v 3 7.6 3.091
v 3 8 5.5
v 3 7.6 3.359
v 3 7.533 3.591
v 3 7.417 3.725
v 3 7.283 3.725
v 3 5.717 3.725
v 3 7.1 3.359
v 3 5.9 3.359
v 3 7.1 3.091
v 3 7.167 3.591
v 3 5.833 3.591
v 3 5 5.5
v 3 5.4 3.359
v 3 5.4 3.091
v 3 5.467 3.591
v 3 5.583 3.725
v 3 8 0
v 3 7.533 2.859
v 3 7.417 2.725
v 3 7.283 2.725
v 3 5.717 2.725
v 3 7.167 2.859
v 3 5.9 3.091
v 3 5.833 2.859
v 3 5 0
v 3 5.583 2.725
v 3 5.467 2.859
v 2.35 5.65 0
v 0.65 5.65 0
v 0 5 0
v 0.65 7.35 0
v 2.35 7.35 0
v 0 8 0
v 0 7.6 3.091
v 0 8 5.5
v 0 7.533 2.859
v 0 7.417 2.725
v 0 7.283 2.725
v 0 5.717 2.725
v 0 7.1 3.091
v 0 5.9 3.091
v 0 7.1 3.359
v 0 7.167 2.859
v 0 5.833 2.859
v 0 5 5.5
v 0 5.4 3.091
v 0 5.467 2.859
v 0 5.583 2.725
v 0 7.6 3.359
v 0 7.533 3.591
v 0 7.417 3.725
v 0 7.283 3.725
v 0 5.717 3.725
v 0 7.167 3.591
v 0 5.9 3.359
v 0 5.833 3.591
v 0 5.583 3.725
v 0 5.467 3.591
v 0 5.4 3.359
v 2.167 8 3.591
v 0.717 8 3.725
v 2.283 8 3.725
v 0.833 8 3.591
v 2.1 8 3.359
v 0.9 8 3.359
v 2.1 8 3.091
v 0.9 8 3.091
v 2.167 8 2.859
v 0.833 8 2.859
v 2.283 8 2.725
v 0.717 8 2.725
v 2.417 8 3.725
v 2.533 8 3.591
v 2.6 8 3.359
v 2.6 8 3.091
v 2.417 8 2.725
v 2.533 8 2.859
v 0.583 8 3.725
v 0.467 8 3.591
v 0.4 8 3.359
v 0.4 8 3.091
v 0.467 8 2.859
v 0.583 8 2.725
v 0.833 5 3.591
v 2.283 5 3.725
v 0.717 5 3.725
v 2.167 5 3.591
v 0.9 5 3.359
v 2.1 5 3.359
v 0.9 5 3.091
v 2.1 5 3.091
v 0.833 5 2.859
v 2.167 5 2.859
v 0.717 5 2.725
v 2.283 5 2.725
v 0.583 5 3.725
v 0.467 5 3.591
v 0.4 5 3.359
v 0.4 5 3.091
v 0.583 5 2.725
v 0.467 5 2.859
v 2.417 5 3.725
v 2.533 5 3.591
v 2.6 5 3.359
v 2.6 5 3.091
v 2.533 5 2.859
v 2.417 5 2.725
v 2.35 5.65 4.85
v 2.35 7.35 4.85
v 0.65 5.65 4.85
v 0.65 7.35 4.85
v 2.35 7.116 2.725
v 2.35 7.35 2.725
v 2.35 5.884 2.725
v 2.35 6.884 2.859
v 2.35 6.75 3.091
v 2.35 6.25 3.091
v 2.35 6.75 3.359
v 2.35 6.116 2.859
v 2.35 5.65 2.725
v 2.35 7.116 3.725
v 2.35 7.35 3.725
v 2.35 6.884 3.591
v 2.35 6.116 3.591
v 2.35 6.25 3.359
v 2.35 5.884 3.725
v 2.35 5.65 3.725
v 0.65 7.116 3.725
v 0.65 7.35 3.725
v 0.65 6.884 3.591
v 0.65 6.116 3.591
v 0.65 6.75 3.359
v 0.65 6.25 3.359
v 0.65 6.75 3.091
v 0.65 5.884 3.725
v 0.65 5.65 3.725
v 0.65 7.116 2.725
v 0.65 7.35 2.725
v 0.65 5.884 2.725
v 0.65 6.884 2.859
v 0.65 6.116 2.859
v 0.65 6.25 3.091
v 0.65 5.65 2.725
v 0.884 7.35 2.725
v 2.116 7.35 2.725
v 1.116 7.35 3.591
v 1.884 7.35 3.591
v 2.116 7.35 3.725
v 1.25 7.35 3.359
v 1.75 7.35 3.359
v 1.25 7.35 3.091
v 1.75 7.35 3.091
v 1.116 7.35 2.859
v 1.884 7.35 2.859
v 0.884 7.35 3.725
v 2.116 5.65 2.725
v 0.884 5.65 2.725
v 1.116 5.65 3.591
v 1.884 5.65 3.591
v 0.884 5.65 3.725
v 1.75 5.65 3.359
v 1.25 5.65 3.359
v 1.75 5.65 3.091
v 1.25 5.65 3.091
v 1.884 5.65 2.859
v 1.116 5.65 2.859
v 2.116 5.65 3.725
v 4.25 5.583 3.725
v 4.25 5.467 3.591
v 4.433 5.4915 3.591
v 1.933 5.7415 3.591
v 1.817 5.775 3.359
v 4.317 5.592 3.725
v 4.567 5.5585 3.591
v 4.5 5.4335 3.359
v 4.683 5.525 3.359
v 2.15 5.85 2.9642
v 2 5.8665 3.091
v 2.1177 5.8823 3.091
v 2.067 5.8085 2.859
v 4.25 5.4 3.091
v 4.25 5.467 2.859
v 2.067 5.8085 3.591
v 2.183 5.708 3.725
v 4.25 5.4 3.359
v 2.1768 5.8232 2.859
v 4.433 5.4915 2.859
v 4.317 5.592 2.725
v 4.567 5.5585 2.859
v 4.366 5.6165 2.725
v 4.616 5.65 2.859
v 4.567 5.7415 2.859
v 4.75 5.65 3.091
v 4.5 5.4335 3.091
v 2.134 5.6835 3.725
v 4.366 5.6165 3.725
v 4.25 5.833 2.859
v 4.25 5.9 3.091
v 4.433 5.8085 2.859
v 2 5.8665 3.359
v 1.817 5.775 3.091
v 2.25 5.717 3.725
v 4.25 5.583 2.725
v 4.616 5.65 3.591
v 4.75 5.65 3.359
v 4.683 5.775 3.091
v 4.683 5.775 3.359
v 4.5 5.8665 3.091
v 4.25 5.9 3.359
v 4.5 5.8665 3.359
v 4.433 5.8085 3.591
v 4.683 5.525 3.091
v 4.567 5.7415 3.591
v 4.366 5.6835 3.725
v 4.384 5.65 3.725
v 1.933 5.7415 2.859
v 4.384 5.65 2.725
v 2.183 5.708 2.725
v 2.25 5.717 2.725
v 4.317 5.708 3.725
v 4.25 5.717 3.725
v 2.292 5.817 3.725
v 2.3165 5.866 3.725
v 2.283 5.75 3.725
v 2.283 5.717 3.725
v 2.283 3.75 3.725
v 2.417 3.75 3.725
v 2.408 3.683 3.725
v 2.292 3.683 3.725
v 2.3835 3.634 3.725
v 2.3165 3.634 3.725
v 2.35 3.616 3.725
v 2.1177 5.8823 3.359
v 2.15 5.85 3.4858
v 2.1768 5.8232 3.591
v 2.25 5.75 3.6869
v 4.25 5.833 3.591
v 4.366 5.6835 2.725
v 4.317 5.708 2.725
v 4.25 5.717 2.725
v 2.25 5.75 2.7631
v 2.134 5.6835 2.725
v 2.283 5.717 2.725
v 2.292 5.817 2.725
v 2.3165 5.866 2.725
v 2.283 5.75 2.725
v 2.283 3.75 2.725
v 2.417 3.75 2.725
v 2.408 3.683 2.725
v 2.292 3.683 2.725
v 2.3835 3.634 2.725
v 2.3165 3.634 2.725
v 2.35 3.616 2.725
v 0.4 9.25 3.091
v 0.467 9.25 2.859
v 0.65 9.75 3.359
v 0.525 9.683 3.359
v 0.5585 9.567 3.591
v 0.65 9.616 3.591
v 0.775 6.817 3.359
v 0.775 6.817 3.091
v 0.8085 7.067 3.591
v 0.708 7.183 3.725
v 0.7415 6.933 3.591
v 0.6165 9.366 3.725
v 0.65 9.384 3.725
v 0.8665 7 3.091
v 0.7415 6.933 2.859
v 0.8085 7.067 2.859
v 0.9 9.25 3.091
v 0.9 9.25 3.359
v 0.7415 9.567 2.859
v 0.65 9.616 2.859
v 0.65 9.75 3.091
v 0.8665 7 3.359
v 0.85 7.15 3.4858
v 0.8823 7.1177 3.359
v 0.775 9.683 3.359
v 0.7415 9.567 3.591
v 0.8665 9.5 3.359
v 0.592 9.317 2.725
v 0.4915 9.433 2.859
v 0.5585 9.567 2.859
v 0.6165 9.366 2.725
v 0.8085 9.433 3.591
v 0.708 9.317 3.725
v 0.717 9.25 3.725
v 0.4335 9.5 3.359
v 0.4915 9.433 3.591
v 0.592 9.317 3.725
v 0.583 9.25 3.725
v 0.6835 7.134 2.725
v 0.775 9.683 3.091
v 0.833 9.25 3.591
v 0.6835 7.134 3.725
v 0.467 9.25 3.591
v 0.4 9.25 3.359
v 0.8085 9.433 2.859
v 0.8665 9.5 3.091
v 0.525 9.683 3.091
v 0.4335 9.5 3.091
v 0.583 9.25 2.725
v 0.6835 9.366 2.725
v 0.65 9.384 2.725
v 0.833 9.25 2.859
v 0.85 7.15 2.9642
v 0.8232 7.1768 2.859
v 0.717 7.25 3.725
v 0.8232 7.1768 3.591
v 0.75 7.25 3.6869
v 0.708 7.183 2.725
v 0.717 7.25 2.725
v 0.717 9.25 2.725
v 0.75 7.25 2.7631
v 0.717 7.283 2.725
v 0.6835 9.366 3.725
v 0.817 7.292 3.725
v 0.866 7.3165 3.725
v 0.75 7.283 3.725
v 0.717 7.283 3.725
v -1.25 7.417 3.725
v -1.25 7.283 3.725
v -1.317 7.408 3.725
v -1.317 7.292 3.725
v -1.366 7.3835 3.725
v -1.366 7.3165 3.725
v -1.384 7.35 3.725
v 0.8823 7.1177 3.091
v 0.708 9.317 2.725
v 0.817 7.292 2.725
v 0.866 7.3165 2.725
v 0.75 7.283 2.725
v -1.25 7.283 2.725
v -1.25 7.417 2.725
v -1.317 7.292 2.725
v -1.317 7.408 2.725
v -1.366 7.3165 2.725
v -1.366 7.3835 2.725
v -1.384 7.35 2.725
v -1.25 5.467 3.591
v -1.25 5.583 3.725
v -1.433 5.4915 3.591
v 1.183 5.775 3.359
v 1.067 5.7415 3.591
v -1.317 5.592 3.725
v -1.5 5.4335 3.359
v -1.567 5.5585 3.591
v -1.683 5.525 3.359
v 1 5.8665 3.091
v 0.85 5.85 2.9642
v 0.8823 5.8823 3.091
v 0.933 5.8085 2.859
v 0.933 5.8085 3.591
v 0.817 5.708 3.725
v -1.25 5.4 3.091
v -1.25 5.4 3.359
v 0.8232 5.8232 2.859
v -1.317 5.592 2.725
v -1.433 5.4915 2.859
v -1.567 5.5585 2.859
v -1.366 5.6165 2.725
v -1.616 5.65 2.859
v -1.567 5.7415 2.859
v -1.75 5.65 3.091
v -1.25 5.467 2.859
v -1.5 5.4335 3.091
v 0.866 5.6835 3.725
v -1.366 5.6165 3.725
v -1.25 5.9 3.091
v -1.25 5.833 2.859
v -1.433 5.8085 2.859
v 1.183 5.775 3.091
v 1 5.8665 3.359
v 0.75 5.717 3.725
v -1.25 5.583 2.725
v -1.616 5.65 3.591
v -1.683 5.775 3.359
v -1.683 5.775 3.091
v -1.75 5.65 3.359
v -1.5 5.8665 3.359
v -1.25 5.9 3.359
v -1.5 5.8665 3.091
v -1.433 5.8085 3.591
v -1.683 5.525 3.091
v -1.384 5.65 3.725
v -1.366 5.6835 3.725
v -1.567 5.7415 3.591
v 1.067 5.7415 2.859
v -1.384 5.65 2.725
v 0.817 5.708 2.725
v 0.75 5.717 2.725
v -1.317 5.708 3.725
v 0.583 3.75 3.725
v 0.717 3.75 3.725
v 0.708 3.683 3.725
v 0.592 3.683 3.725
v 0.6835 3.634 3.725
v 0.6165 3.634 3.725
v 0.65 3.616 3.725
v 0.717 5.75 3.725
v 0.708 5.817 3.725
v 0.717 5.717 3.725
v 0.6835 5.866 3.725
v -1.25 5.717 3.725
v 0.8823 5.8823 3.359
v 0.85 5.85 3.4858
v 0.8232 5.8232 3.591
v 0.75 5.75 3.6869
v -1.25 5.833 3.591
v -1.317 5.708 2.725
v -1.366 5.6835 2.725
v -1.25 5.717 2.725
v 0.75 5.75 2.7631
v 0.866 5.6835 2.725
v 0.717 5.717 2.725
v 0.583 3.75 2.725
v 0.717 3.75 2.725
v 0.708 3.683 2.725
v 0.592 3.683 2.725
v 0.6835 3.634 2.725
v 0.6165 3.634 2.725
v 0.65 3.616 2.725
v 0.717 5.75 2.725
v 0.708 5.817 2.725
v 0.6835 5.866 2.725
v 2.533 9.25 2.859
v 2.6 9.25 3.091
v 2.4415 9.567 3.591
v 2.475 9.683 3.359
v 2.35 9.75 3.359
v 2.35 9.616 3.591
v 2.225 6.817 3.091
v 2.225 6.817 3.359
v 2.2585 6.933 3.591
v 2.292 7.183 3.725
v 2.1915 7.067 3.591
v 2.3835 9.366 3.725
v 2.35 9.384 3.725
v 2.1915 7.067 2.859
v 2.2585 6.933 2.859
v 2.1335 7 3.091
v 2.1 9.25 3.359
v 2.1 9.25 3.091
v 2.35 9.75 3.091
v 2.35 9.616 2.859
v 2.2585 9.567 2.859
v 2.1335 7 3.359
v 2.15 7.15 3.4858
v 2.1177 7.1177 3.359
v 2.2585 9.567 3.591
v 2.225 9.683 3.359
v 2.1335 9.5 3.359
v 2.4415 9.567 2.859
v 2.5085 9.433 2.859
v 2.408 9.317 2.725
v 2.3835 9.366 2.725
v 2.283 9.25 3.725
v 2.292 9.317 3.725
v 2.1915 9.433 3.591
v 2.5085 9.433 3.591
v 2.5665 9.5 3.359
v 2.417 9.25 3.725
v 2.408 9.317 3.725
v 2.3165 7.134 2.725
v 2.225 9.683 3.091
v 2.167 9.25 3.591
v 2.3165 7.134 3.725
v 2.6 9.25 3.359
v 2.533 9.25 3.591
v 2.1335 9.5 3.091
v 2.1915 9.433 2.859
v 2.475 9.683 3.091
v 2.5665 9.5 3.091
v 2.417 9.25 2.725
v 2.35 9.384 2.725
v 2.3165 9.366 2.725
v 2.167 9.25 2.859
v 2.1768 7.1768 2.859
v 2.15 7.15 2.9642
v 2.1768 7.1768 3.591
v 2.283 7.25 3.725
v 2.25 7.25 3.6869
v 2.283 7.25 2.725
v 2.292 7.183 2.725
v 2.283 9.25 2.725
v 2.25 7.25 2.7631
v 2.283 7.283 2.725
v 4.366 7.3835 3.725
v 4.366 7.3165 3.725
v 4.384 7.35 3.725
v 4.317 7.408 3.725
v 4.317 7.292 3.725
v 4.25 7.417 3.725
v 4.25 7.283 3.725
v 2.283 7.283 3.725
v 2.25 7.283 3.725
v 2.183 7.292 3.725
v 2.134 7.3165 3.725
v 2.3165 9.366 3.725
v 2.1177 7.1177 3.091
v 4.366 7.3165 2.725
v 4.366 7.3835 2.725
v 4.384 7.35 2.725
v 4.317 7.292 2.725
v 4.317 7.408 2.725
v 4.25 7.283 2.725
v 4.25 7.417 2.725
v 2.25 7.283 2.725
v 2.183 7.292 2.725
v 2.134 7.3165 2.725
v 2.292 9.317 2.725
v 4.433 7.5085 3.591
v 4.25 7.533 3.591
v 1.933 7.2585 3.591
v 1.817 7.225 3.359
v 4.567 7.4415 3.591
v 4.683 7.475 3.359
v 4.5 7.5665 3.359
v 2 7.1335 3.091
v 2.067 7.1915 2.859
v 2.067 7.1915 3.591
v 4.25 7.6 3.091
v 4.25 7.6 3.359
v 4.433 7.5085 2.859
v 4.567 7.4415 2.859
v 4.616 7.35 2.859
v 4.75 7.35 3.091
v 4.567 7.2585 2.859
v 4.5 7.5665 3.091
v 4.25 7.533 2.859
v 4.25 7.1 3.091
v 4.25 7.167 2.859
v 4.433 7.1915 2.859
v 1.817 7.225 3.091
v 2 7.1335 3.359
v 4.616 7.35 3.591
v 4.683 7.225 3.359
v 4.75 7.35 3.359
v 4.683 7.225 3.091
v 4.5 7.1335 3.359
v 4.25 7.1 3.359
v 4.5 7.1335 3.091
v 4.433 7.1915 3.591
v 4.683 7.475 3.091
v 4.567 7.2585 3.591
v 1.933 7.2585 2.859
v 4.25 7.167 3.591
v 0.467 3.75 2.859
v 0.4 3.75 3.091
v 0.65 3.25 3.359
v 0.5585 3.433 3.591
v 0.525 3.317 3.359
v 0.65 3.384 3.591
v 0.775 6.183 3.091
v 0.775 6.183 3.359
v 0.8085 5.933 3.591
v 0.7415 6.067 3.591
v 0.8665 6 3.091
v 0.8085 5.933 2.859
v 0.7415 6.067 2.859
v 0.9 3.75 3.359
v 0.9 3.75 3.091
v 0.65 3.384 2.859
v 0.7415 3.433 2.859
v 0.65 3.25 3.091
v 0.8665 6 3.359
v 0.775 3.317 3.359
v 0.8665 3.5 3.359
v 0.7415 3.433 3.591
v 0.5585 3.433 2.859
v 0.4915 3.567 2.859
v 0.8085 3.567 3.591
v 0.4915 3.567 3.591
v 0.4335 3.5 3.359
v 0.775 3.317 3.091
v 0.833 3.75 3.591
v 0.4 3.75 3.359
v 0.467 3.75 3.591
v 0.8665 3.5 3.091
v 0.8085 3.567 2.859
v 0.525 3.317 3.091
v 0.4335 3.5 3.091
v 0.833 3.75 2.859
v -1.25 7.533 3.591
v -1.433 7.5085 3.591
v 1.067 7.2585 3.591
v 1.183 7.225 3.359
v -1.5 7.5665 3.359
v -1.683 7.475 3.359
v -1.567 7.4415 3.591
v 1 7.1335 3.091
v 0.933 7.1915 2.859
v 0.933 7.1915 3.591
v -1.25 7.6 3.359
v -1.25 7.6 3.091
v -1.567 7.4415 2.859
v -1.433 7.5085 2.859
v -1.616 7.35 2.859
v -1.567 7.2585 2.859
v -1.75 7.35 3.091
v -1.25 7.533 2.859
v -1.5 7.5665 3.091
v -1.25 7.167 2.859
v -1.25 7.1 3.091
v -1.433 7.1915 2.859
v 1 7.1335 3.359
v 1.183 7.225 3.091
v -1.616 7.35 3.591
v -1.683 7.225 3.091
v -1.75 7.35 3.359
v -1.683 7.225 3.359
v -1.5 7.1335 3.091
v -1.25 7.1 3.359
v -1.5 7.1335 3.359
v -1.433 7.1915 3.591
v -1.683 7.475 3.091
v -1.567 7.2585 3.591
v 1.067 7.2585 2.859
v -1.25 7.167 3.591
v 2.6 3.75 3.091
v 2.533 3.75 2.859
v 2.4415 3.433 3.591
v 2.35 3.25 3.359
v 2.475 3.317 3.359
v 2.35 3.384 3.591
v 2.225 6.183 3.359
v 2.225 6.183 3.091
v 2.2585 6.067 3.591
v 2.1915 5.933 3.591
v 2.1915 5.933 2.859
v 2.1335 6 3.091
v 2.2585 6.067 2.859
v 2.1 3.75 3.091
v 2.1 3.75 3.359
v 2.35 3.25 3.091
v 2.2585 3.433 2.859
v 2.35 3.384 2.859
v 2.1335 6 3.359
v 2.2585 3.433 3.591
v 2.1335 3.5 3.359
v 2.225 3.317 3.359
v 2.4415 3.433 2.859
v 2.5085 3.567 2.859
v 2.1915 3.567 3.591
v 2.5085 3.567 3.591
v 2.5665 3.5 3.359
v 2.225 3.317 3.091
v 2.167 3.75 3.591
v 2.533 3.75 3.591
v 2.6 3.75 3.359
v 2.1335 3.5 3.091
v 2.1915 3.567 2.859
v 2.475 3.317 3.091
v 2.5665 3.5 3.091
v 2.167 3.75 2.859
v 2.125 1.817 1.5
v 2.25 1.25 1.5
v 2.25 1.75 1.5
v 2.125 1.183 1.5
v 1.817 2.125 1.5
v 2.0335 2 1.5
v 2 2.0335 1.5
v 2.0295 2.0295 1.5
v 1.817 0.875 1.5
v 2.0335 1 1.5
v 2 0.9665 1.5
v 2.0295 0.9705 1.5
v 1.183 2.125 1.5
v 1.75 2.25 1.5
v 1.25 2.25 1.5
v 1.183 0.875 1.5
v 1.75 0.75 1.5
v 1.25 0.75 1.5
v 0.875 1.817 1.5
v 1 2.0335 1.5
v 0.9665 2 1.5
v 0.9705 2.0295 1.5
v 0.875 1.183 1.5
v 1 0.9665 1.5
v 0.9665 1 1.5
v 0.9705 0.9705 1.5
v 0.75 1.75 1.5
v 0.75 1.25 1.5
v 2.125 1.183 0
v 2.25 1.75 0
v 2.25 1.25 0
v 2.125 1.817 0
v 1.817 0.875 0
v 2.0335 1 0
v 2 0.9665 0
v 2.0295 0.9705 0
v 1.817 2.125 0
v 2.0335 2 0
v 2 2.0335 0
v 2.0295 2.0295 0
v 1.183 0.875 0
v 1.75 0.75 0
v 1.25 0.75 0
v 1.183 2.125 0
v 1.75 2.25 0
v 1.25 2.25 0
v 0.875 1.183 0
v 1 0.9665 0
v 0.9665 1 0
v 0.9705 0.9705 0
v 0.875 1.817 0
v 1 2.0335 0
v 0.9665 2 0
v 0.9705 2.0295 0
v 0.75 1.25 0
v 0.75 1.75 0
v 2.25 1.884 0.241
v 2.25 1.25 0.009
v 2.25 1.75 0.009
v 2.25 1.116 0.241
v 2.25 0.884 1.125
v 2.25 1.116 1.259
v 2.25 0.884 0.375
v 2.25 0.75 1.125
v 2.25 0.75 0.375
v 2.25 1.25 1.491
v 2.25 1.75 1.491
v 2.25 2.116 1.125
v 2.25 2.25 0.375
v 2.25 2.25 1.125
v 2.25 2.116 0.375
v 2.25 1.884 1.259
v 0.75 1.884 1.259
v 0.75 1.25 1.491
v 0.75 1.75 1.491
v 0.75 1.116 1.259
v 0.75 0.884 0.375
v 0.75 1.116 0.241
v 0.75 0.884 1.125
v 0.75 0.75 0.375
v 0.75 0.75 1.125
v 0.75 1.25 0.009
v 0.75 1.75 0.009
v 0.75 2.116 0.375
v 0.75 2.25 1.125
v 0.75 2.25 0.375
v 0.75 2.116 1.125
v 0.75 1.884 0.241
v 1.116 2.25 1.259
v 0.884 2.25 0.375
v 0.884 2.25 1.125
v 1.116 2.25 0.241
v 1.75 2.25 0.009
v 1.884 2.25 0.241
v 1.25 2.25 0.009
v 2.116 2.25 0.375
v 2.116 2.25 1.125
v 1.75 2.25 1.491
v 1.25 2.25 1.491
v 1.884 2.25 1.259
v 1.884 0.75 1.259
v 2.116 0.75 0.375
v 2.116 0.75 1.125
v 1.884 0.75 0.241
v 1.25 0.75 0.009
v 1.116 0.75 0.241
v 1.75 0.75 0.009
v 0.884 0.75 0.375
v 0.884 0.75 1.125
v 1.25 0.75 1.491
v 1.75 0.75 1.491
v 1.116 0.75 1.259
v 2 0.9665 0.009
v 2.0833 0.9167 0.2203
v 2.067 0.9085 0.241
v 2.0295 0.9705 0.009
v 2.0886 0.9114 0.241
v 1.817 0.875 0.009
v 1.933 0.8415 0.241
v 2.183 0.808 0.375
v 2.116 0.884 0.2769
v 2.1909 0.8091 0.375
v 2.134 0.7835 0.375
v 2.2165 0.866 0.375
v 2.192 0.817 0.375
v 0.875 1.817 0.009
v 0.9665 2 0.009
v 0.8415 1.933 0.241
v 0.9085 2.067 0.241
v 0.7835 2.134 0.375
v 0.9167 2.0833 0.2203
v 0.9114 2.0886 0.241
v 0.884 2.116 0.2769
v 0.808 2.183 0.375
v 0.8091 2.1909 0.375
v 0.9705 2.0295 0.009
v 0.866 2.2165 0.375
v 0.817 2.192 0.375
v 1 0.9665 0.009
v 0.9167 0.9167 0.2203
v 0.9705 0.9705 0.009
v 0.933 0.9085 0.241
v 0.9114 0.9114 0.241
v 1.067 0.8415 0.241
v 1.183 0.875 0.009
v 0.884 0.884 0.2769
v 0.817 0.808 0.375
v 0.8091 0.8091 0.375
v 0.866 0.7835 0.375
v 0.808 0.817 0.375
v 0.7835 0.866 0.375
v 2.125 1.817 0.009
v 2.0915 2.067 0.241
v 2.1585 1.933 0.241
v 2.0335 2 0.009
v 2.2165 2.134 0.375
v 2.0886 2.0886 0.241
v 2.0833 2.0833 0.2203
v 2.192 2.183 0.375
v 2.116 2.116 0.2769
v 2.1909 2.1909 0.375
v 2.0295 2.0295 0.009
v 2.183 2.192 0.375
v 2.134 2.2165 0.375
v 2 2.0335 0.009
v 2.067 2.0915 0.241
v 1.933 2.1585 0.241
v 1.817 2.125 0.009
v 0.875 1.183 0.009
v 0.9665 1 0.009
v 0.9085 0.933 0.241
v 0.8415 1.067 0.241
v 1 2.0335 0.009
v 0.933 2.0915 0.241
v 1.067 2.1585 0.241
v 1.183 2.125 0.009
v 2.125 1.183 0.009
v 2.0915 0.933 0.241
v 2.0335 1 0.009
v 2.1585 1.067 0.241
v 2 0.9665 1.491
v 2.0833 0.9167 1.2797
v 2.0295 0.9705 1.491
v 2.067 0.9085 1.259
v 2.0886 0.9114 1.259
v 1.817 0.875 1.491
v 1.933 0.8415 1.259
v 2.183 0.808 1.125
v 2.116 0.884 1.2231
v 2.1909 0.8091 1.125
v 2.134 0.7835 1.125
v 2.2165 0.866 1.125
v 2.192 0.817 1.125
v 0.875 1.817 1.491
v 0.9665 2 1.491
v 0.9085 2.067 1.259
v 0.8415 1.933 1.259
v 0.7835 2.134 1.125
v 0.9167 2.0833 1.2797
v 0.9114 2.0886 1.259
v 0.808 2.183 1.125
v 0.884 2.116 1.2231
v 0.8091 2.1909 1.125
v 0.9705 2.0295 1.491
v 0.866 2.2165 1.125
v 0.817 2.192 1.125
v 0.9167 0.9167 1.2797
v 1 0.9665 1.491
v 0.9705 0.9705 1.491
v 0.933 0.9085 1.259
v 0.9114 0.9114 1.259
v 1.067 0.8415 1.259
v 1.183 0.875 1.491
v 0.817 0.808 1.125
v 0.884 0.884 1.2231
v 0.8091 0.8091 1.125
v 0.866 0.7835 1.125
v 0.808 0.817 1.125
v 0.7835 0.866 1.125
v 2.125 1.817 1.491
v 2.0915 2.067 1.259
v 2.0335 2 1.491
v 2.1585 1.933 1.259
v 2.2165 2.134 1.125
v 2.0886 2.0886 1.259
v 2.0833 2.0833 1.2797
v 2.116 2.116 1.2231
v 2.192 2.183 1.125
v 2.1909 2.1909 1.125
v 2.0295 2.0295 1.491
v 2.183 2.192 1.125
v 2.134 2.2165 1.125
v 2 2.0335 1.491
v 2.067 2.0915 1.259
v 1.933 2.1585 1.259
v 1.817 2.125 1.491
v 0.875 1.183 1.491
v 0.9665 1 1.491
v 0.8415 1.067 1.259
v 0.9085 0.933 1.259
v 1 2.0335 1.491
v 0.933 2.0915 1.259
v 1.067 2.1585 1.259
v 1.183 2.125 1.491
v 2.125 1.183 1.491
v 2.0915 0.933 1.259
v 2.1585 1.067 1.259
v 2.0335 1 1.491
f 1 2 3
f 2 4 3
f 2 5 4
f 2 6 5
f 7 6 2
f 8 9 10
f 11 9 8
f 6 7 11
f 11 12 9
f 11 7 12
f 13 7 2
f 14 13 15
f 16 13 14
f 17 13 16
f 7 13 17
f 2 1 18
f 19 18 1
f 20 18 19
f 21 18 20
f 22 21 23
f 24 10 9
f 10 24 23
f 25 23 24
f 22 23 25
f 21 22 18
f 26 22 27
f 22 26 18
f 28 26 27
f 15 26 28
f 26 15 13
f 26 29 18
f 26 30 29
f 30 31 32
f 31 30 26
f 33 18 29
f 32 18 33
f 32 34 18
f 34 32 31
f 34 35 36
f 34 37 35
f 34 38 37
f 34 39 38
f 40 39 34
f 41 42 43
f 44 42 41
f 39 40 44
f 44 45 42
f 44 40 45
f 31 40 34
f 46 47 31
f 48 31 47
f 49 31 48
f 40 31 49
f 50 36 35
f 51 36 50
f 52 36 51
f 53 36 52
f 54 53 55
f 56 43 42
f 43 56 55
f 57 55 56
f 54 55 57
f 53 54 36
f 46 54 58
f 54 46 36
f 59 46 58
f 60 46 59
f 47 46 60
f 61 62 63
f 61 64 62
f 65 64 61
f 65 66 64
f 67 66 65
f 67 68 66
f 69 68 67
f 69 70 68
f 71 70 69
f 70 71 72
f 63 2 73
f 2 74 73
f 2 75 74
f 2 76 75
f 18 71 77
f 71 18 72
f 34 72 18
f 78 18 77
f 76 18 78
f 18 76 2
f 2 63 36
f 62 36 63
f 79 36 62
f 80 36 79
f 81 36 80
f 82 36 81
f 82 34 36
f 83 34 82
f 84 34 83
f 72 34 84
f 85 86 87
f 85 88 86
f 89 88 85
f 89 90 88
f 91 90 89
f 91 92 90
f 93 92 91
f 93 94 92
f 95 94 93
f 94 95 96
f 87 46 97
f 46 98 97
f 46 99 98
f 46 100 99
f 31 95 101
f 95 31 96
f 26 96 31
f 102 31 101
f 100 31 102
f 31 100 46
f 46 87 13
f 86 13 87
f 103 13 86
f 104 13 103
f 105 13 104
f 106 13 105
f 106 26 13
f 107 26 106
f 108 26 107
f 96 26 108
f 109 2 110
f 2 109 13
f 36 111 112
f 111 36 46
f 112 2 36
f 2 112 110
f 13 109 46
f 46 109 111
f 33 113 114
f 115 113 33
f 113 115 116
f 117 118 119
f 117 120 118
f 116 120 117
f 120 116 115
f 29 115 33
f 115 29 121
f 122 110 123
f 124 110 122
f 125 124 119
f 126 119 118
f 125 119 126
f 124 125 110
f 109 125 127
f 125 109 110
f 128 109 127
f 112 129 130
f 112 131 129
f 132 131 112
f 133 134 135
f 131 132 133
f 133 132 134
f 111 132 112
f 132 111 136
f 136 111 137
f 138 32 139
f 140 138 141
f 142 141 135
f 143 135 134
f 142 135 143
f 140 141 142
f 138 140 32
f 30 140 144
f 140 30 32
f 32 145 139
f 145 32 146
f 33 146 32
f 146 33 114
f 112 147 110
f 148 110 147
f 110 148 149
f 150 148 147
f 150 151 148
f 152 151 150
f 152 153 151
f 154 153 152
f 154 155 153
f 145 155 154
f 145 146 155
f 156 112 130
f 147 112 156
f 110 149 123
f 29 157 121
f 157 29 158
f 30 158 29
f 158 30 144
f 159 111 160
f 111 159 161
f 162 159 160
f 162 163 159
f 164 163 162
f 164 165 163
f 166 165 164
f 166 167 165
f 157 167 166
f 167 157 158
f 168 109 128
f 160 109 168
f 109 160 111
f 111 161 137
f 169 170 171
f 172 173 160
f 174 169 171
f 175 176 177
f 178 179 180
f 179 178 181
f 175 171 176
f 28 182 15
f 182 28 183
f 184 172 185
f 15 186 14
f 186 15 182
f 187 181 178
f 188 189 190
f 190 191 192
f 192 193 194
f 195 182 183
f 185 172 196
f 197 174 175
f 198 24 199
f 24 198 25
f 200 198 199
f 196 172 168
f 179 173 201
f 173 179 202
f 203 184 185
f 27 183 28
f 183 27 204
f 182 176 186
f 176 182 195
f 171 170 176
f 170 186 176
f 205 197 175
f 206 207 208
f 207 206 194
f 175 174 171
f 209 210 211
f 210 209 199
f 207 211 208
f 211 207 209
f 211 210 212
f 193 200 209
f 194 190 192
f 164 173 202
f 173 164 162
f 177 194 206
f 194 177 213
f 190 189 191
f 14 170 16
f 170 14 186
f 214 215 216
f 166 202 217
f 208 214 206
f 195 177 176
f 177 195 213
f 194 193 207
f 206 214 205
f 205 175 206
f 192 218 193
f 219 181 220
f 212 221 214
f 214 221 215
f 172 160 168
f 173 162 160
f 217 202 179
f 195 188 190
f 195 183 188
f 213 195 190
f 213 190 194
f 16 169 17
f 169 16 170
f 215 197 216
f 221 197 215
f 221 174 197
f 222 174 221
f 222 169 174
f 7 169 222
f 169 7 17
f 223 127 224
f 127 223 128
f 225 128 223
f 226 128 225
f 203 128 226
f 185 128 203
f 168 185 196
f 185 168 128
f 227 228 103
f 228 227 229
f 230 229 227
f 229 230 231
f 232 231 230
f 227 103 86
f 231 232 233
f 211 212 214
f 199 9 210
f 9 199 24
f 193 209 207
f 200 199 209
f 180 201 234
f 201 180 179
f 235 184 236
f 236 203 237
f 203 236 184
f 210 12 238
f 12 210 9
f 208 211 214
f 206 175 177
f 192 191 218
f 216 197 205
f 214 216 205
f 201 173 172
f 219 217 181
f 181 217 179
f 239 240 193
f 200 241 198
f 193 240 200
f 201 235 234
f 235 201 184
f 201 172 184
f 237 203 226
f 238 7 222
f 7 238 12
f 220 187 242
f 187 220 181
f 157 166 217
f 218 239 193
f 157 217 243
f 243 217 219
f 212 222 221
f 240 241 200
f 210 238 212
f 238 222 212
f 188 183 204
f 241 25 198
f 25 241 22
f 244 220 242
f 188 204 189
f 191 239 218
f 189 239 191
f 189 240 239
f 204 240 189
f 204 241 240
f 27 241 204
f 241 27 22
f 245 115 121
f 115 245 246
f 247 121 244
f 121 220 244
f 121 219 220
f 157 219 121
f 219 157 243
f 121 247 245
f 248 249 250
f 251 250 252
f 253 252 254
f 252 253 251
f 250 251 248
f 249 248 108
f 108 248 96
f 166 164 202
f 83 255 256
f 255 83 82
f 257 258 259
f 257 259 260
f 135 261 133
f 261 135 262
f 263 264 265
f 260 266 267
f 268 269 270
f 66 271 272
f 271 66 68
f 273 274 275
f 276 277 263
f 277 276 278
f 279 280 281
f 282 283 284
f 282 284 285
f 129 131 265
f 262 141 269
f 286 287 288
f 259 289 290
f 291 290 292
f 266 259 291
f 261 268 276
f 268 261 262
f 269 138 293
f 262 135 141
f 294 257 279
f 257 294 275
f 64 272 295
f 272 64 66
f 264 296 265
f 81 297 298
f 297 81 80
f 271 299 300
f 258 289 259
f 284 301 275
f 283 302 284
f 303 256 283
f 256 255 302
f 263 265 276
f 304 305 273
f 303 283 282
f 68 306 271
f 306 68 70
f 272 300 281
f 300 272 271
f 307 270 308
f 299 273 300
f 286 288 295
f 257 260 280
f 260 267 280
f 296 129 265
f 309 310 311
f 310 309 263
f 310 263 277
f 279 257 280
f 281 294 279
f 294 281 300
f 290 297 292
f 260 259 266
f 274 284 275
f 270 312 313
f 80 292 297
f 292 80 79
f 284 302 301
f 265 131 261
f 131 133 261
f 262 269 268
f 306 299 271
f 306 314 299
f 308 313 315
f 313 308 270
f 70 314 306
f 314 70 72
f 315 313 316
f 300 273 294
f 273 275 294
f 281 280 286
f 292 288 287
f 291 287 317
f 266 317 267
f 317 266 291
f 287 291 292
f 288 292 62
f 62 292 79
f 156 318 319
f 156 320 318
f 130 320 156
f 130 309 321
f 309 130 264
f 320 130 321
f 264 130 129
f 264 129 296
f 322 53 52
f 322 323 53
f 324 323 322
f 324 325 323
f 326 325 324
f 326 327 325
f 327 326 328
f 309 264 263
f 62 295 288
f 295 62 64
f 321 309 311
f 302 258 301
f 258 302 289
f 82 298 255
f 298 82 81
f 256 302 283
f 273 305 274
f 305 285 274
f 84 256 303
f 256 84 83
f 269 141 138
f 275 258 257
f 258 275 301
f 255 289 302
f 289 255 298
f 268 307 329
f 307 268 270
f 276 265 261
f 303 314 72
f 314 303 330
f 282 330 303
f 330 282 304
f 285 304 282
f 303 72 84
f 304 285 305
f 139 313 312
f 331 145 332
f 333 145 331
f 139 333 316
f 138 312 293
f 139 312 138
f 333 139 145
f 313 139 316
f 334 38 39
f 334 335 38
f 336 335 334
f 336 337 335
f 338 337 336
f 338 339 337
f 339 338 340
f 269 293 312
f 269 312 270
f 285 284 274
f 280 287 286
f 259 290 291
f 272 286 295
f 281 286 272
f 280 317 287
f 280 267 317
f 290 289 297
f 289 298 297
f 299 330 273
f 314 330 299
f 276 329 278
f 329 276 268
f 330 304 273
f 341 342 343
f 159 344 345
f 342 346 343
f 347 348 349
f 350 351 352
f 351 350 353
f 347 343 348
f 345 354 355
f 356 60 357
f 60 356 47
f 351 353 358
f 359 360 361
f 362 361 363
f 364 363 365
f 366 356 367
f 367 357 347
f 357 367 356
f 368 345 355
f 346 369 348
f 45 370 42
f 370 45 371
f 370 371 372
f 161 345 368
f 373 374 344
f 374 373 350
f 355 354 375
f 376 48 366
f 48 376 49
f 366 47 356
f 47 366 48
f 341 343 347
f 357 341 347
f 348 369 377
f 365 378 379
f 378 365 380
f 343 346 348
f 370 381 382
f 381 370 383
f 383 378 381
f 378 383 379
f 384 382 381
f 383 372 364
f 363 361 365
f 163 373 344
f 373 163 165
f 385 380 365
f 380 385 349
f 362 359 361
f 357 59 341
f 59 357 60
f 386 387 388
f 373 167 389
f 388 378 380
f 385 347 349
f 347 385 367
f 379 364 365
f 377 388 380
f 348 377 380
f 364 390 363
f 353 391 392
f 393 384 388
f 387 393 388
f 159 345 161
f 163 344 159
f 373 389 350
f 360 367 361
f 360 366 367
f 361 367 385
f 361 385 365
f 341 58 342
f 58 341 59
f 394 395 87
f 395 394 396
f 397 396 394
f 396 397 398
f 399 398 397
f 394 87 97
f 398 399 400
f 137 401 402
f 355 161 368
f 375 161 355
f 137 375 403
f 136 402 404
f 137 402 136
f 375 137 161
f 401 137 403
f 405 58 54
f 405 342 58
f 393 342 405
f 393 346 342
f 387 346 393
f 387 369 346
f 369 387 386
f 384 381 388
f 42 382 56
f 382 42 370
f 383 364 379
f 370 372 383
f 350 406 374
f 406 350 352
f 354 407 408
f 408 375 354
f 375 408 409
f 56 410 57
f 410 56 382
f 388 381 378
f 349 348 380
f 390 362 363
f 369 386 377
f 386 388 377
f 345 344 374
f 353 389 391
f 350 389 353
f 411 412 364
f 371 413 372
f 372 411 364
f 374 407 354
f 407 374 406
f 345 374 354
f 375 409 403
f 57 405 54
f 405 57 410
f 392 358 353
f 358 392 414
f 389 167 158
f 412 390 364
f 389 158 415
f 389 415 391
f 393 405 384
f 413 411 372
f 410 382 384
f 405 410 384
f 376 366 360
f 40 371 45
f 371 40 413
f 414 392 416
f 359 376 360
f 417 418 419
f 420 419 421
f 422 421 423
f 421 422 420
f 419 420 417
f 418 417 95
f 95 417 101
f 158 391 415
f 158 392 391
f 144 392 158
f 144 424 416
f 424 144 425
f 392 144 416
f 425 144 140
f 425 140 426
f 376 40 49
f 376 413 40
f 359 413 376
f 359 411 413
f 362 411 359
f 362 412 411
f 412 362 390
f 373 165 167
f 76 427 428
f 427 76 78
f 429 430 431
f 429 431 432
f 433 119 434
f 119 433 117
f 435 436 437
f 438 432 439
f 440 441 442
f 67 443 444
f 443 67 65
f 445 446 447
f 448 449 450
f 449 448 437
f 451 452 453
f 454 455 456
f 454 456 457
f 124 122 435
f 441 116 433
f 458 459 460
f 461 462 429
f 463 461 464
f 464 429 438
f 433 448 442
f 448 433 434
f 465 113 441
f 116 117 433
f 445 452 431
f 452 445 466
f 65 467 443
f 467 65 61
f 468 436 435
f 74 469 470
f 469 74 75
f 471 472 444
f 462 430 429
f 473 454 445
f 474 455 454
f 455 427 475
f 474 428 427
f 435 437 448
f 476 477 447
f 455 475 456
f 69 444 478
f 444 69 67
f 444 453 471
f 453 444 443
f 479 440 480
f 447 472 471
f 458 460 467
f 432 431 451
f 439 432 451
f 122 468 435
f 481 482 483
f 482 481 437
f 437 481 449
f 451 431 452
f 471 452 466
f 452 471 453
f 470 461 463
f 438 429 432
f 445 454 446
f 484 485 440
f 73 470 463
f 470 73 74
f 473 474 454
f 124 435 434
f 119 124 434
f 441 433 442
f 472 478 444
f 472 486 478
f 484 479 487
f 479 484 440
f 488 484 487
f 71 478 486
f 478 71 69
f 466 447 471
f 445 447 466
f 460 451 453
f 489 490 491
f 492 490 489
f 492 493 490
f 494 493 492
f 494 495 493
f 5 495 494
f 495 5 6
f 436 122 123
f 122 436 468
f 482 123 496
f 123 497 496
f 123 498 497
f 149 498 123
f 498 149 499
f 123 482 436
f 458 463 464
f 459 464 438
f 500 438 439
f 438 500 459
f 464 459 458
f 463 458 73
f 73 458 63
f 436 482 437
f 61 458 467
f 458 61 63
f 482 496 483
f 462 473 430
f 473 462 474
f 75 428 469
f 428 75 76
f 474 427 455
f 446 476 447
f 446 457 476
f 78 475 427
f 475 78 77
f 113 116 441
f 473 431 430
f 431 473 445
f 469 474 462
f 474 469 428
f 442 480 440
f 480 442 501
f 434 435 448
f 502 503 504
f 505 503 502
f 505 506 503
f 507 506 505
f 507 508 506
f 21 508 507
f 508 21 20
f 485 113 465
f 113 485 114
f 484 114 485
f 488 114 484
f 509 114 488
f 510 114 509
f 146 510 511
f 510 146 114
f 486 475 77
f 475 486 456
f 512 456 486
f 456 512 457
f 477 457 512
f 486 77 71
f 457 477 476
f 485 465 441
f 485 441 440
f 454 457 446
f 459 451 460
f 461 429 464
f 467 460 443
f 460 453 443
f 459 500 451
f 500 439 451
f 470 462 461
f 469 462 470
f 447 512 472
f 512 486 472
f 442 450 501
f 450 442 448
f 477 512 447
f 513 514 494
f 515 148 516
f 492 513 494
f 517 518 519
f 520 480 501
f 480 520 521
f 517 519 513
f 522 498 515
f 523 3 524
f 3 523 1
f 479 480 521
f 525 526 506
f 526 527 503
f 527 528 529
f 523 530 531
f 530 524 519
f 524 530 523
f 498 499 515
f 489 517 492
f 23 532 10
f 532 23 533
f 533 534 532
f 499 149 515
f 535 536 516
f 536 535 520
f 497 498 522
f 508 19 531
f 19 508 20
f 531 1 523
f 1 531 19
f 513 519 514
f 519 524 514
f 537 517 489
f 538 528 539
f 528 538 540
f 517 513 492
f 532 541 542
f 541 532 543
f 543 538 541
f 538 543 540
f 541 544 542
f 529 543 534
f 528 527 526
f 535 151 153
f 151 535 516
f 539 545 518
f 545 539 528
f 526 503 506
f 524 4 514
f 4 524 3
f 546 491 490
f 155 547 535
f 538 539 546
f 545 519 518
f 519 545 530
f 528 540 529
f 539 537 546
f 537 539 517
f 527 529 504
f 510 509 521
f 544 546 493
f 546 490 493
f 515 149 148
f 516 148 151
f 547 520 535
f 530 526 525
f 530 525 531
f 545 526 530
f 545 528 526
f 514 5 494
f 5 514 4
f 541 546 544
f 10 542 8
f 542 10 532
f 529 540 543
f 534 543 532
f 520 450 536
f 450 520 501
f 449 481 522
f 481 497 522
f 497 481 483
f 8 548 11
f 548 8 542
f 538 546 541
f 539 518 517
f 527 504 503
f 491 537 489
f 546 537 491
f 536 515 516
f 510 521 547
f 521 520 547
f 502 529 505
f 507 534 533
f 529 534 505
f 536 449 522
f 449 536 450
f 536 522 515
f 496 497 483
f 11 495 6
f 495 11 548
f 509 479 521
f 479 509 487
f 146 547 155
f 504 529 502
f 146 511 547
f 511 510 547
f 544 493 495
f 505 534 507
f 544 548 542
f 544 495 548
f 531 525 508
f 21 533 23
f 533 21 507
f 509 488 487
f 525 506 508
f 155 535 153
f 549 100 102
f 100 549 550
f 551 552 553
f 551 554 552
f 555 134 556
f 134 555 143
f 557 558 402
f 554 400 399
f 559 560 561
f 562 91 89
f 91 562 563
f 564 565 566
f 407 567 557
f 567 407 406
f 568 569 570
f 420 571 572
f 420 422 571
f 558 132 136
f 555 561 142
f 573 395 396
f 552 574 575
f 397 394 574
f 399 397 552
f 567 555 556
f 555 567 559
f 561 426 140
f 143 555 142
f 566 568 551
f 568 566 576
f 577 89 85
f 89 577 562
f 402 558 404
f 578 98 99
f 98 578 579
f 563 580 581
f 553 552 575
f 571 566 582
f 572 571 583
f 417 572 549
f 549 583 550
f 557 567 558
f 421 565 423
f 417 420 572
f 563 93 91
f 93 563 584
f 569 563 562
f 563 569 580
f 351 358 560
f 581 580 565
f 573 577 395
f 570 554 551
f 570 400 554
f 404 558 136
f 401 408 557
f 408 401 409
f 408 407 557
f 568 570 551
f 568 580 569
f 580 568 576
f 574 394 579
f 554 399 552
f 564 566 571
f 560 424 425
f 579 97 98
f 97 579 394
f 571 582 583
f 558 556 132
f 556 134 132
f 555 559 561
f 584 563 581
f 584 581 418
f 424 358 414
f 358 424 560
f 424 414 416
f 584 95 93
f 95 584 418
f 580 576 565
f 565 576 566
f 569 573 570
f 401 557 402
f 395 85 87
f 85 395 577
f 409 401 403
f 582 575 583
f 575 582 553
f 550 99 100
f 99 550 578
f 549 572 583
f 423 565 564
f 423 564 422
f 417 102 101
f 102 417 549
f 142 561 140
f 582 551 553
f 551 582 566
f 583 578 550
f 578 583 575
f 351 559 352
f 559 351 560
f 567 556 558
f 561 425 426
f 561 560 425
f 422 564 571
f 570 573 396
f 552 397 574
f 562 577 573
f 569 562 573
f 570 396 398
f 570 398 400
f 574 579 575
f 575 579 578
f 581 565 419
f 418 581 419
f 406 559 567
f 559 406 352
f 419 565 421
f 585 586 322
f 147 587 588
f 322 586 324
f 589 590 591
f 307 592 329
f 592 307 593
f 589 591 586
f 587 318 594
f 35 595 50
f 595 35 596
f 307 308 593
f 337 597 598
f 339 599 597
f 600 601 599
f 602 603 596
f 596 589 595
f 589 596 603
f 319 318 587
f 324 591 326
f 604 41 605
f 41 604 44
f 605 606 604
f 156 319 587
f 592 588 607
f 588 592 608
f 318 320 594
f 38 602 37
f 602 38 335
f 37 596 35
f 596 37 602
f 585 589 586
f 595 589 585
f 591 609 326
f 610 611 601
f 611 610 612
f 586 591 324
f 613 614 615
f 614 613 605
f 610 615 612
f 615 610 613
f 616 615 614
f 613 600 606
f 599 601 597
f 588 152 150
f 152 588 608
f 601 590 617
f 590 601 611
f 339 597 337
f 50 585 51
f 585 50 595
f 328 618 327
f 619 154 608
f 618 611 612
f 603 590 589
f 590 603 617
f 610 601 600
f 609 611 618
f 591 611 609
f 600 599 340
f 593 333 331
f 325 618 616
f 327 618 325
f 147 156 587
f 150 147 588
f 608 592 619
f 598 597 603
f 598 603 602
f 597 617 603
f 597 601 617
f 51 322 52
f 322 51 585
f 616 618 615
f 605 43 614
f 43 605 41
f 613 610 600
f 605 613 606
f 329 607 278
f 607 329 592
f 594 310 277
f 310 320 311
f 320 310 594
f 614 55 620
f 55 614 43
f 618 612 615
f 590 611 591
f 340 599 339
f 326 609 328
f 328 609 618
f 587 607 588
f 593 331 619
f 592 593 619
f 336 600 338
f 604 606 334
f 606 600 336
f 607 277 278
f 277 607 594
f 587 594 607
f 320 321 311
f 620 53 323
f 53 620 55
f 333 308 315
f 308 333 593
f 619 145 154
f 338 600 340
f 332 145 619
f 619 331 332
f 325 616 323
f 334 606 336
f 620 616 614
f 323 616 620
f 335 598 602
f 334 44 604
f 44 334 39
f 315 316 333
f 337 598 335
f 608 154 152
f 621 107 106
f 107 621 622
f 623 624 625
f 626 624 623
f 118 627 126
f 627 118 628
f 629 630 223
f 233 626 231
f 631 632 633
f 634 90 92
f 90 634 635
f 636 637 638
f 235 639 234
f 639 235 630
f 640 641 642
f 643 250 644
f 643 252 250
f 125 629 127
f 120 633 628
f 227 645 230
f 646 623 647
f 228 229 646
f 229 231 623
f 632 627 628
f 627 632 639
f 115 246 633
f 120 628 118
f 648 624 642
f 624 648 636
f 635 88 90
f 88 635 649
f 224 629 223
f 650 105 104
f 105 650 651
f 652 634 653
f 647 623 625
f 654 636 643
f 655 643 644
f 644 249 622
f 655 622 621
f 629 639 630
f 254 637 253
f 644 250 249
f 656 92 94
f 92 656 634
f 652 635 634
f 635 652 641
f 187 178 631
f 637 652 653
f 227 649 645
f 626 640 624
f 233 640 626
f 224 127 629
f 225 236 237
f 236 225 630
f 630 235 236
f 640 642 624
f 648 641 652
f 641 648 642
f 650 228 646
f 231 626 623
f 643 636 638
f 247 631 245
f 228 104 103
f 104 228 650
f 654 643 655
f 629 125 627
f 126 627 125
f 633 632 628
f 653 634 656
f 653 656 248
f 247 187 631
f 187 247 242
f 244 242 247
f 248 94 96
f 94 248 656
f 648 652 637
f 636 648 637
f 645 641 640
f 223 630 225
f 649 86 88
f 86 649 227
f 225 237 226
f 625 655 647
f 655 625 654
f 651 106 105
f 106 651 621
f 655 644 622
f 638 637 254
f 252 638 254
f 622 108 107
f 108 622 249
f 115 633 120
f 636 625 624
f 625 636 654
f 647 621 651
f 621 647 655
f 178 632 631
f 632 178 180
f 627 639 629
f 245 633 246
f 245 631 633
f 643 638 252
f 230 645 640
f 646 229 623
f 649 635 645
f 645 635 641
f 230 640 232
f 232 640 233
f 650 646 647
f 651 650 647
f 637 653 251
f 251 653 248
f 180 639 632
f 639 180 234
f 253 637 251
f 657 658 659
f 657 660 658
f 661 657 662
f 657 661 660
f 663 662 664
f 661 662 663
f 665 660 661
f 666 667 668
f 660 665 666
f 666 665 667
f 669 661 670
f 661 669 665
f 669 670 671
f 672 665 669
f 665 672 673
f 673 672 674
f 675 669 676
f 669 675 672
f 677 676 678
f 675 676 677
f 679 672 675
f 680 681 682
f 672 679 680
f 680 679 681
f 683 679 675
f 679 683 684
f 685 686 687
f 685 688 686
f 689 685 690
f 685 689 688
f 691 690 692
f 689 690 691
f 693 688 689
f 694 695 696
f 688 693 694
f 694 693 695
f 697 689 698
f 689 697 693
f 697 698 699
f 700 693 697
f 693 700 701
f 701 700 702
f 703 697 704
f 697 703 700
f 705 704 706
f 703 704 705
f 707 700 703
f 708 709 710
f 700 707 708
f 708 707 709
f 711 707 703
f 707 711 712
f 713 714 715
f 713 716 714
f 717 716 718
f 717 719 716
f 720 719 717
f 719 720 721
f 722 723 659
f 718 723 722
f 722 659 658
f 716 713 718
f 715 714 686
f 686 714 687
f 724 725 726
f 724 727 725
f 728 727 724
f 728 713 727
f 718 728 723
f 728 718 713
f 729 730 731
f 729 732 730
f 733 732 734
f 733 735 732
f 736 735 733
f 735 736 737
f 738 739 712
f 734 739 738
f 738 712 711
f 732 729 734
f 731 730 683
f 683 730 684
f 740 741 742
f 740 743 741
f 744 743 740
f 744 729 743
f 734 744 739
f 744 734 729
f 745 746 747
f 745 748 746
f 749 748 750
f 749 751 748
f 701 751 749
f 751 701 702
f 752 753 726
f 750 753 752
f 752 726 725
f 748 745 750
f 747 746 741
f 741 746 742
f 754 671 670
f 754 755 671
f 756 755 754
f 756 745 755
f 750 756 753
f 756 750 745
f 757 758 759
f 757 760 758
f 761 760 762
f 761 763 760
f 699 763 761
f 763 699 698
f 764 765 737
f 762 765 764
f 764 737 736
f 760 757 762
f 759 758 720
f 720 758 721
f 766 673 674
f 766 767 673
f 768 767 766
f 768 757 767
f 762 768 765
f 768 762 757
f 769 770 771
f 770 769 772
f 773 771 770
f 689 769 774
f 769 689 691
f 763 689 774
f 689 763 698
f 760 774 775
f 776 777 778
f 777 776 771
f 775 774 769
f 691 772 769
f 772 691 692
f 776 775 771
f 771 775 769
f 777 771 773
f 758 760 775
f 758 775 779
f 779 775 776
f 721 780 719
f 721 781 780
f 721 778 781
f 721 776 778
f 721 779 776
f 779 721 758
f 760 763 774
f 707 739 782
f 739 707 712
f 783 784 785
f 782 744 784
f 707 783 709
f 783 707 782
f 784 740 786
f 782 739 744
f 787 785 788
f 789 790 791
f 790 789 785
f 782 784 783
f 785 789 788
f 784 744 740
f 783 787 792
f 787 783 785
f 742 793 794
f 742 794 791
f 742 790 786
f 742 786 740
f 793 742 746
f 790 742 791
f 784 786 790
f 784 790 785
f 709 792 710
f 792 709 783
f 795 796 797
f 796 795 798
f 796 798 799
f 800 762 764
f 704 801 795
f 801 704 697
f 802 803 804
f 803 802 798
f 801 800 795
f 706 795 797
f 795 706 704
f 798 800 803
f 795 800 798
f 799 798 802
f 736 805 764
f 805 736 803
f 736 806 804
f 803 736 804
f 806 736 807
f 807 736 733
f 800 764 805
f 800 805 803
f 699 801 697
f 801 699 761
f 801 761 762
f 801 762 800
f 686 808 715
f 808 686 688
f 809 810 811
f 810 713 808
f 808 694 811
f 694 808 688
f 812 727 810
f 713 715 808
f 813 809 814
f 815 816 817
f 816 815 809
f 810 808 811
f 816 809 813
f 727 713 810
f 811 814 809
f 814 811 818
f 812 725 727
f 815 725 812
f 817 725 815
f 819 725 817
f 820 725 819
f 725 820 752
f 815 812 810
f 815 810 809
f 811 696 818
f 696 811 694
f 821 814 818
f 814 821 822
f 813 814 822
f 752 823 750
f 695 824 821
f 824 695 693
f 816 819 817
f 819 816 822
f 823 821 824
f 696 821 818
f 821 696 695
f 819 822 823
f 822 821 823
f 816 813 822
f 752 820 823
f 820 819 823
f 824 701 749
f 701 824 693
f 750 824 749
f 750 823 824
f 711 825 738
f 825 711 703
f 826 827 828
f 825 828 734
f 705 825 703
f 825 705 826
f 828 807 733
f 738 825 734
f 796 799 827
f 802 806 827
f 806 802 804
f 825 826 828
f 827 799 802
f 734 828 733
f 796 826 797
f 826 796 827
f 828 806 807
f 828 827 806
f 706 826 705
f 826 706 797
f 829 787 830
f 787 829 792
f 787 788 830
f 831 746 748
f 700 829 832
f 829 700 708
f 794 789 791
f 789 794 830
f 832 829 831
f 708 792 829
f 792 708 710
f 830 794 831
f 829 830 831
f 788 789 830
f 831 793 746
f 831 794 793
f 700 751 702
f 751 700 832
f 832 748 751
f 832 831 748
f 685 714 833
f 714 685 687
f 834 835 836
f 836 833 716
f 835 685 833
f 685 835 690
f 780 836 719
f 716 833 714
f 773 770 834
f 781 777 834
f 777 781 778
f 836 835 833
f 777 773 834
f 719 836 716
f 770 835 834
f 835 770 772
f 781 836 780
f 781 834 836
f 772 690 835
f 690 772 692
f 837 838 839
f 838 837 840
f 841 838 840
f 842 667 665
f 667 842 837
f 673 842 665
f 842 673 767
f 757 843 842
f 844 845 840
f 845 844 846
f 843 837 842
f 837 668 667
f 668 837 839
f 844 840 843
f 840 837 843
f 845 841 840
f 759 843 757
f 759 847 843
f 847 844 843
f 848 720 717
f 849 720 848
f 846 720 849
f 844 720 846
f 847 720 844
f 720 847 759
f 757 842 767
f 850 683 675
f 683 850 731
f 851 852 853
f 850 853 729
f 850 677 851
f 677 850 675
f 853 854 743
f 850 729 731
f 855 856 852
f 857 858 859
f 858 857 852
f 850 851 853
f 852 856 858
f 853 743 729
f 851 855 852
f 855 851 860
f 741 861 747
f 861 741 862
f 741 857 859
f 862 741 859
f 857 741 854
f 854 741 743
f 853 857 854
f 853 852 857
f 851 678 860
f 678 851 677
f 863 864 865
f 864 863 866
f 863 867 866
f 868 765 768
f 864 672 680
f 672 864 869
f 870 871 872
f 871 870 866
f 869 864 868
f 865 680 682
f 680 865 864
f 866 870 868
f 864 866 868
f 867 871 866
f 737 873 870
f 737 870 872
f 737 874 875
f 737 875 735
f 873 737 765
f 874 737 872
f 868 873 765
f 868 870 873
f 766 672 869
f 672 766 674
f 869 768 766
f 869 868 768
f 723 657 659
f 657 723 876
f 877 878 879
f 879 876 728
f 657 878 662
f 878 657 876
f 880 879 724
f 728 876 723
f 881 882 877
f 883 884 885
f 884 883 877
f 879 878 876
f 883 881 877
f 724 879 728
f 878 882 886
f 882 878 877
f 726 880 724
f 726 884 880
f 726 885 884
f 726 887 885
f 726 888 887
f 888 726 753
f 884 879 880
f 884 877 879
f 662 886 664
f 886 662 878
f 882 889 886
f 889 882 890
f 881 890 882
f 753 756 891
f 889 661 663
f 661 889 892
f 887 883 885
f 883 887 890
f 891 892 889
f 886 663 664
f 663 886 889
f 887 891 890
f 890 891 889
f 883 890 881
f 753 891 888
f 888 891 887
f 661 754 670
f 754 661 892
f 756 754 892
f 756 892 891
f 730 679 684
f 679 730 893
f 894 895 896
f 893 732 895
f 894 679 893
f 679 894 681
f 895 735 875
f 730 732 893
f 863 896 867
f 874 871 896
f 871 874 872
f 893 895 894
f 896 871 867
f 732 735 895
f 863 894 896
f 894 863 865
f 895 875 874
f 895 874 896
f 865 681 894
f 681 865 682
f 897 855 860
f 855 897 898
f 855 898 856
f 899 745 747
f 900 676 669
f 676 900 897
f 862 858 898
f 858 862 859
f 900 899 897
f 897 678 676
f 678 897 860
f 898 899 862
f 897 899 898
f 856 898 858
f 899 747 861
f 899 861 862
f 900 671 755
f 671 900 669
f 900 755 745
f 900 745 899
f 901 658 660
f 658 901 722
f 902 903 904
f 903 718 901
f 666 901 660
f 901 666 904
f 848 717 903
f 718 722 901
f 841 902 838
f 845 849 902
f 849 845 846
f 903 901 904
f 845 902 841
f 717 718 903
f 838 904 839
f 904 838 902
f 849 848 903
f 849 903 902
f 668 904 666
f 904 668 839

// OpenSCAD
// BGSD
include <../lib/boardgame_insert_toolkit_lib.4.scad>;
data = [
    // Source STL: Tokens B.stl
    // STL bbox min [-66, -36, 0] max [-14, 119, 28] size [52, 155, 28]
    // Detected compartments: 3; wall thickness: 1.5mm
    // Estimated bottom thickness: 0.8mm
    // Inferred side cutouts: left (medium)
    // Inferred external profile cuts: back-right [19, 11]
    // Tokens B cavity 1: SQUARE shape (high, curved ratio 0)
    // Tokens B cavity 2: SQUARE shape (high, curved ratio 0)
    // Tokens B cavity 3: SQUARE shape (high, curved ratio 0)
    // Tokens B profile extension: SQUARE shape (high, curved ratio 0)
    [ OBJECT_BOX,
        [ NAME, "Tokens B" ],
        [ BOX_SIZE_XYZ, [52, 155, 28] ],
        [ BOX_WALL_THICKNESS, 1.5 ],
        [ BOX_NO_LID_B, true ],
        [ BOX_FEATURE,
            [ NAME, "Tokens B cavity 1" ],
            [ FTR_COMPARTMENT_SIZE_XYZ, [49, 48, 26.5] ],
            [ FTR_NUM_COMPARTMENTS_XY, [1, 1] ],
            [ FTR_SHAPE, SQUARE ],
            [ POSITION_XY, [0, 0] ],
            [ FTR_CUTOUT_SIDES_4B, [false, false, true, false] ],
            [ FTR_CUTOUT_TYPE, INTERIOR ],
            [ FTR_CUTOUT_HEIGHT_PCT, 47.943 ],
            [ FTR_CUTOUT_DEPTH_PCT, 25.929 ],
            [ FTR_CUTOUT_WIDTH_PCT, 95 ],
        ],
        [ BOX_FEATURE,
            [ NAME, "Tokens B cavity 2" ],
            [ FTR_COMPARTMENT_SIZE_XYZ, [49, 48, 26.5] ],
            [ FTR_NUM_COMPARTMENTS_XY, [1, 1] ],
            [ FTR_SHAPE, SQUARE ],
            [ POSITION_XY, [0, 49.5] ],
            [ FTR_CUTOUT_SIDES_4B, [false, false, true, false] ],
            [ FTR_CUTOUT_TYPE, INTERIOR ],
            [ FTR_CUTOUT_HEIGHT_PCT, 47.943 ],
            [ FTR_CUTOUT_DEPTH_PCT, 25.929 ],
            [ FTR_CUTOUT_WIDTH_PCT, 95 ],
        ],
        [ BOX_FEATURE,
            [ NAME, "Tokens B cavity 3" ],
            [ FTR_COMPARTMENT_SIZE_XYZ, [49, 42, 26.5] ],
            [ FTR_NUM_COMPARTMENTS_XY, [1, 1] ],
            [ FTR_SHAPE, SQUARE ],
            [ POSITION_XY, [0, 99] ],
            [ FTR_CUTOUT_SIDES_4B, [false, false, true, false] ],
            [ FTR_CUTOUT_TYPE, INTERIOR ],
            [ FTR_CUTOUT_HEIGHT_PCT, 47.943 ],
            [ FTR_CUTOUT_DEPTH_PCT, 25.929 ],
            [ FTR_CUTOUT_WIDTH_PCT, 95 ],
        ],
        [ BOX_FEATURE,
            [ NAME, "Tokens B profile extension" ],
            [ FTR_COMPARTMENT_SIZE_XYZ, [30, 11, 26.5] ],
            [ FTR_NUM_COMPARTMENTS_XY, [1, 1] ],
            [ FTR_SHAPE, SQUARE ],
            [ POSITION_XY, [0, 141] ],
            [ FTR_CUTOUT_SIDES_4B, [false, false, true, false] ],
            [ FTR_CUTOUT_TYPE, INTERIOR ],
            [ FTR_CUTOUT_HEIGHT_PCT, 47.943 ],
            [ FTR_CUTOUT_DEPTH_PCT, 42.35 ],
            [ FTR_CUTOUT_WIDTH_PCT, 90.909 ],
        ],
    ],
];
difference() {
    Make(data);
    // back-right external step
    translate([33, 144, -0.05]) cube([19.05, 11.05, 28.1]);
}
